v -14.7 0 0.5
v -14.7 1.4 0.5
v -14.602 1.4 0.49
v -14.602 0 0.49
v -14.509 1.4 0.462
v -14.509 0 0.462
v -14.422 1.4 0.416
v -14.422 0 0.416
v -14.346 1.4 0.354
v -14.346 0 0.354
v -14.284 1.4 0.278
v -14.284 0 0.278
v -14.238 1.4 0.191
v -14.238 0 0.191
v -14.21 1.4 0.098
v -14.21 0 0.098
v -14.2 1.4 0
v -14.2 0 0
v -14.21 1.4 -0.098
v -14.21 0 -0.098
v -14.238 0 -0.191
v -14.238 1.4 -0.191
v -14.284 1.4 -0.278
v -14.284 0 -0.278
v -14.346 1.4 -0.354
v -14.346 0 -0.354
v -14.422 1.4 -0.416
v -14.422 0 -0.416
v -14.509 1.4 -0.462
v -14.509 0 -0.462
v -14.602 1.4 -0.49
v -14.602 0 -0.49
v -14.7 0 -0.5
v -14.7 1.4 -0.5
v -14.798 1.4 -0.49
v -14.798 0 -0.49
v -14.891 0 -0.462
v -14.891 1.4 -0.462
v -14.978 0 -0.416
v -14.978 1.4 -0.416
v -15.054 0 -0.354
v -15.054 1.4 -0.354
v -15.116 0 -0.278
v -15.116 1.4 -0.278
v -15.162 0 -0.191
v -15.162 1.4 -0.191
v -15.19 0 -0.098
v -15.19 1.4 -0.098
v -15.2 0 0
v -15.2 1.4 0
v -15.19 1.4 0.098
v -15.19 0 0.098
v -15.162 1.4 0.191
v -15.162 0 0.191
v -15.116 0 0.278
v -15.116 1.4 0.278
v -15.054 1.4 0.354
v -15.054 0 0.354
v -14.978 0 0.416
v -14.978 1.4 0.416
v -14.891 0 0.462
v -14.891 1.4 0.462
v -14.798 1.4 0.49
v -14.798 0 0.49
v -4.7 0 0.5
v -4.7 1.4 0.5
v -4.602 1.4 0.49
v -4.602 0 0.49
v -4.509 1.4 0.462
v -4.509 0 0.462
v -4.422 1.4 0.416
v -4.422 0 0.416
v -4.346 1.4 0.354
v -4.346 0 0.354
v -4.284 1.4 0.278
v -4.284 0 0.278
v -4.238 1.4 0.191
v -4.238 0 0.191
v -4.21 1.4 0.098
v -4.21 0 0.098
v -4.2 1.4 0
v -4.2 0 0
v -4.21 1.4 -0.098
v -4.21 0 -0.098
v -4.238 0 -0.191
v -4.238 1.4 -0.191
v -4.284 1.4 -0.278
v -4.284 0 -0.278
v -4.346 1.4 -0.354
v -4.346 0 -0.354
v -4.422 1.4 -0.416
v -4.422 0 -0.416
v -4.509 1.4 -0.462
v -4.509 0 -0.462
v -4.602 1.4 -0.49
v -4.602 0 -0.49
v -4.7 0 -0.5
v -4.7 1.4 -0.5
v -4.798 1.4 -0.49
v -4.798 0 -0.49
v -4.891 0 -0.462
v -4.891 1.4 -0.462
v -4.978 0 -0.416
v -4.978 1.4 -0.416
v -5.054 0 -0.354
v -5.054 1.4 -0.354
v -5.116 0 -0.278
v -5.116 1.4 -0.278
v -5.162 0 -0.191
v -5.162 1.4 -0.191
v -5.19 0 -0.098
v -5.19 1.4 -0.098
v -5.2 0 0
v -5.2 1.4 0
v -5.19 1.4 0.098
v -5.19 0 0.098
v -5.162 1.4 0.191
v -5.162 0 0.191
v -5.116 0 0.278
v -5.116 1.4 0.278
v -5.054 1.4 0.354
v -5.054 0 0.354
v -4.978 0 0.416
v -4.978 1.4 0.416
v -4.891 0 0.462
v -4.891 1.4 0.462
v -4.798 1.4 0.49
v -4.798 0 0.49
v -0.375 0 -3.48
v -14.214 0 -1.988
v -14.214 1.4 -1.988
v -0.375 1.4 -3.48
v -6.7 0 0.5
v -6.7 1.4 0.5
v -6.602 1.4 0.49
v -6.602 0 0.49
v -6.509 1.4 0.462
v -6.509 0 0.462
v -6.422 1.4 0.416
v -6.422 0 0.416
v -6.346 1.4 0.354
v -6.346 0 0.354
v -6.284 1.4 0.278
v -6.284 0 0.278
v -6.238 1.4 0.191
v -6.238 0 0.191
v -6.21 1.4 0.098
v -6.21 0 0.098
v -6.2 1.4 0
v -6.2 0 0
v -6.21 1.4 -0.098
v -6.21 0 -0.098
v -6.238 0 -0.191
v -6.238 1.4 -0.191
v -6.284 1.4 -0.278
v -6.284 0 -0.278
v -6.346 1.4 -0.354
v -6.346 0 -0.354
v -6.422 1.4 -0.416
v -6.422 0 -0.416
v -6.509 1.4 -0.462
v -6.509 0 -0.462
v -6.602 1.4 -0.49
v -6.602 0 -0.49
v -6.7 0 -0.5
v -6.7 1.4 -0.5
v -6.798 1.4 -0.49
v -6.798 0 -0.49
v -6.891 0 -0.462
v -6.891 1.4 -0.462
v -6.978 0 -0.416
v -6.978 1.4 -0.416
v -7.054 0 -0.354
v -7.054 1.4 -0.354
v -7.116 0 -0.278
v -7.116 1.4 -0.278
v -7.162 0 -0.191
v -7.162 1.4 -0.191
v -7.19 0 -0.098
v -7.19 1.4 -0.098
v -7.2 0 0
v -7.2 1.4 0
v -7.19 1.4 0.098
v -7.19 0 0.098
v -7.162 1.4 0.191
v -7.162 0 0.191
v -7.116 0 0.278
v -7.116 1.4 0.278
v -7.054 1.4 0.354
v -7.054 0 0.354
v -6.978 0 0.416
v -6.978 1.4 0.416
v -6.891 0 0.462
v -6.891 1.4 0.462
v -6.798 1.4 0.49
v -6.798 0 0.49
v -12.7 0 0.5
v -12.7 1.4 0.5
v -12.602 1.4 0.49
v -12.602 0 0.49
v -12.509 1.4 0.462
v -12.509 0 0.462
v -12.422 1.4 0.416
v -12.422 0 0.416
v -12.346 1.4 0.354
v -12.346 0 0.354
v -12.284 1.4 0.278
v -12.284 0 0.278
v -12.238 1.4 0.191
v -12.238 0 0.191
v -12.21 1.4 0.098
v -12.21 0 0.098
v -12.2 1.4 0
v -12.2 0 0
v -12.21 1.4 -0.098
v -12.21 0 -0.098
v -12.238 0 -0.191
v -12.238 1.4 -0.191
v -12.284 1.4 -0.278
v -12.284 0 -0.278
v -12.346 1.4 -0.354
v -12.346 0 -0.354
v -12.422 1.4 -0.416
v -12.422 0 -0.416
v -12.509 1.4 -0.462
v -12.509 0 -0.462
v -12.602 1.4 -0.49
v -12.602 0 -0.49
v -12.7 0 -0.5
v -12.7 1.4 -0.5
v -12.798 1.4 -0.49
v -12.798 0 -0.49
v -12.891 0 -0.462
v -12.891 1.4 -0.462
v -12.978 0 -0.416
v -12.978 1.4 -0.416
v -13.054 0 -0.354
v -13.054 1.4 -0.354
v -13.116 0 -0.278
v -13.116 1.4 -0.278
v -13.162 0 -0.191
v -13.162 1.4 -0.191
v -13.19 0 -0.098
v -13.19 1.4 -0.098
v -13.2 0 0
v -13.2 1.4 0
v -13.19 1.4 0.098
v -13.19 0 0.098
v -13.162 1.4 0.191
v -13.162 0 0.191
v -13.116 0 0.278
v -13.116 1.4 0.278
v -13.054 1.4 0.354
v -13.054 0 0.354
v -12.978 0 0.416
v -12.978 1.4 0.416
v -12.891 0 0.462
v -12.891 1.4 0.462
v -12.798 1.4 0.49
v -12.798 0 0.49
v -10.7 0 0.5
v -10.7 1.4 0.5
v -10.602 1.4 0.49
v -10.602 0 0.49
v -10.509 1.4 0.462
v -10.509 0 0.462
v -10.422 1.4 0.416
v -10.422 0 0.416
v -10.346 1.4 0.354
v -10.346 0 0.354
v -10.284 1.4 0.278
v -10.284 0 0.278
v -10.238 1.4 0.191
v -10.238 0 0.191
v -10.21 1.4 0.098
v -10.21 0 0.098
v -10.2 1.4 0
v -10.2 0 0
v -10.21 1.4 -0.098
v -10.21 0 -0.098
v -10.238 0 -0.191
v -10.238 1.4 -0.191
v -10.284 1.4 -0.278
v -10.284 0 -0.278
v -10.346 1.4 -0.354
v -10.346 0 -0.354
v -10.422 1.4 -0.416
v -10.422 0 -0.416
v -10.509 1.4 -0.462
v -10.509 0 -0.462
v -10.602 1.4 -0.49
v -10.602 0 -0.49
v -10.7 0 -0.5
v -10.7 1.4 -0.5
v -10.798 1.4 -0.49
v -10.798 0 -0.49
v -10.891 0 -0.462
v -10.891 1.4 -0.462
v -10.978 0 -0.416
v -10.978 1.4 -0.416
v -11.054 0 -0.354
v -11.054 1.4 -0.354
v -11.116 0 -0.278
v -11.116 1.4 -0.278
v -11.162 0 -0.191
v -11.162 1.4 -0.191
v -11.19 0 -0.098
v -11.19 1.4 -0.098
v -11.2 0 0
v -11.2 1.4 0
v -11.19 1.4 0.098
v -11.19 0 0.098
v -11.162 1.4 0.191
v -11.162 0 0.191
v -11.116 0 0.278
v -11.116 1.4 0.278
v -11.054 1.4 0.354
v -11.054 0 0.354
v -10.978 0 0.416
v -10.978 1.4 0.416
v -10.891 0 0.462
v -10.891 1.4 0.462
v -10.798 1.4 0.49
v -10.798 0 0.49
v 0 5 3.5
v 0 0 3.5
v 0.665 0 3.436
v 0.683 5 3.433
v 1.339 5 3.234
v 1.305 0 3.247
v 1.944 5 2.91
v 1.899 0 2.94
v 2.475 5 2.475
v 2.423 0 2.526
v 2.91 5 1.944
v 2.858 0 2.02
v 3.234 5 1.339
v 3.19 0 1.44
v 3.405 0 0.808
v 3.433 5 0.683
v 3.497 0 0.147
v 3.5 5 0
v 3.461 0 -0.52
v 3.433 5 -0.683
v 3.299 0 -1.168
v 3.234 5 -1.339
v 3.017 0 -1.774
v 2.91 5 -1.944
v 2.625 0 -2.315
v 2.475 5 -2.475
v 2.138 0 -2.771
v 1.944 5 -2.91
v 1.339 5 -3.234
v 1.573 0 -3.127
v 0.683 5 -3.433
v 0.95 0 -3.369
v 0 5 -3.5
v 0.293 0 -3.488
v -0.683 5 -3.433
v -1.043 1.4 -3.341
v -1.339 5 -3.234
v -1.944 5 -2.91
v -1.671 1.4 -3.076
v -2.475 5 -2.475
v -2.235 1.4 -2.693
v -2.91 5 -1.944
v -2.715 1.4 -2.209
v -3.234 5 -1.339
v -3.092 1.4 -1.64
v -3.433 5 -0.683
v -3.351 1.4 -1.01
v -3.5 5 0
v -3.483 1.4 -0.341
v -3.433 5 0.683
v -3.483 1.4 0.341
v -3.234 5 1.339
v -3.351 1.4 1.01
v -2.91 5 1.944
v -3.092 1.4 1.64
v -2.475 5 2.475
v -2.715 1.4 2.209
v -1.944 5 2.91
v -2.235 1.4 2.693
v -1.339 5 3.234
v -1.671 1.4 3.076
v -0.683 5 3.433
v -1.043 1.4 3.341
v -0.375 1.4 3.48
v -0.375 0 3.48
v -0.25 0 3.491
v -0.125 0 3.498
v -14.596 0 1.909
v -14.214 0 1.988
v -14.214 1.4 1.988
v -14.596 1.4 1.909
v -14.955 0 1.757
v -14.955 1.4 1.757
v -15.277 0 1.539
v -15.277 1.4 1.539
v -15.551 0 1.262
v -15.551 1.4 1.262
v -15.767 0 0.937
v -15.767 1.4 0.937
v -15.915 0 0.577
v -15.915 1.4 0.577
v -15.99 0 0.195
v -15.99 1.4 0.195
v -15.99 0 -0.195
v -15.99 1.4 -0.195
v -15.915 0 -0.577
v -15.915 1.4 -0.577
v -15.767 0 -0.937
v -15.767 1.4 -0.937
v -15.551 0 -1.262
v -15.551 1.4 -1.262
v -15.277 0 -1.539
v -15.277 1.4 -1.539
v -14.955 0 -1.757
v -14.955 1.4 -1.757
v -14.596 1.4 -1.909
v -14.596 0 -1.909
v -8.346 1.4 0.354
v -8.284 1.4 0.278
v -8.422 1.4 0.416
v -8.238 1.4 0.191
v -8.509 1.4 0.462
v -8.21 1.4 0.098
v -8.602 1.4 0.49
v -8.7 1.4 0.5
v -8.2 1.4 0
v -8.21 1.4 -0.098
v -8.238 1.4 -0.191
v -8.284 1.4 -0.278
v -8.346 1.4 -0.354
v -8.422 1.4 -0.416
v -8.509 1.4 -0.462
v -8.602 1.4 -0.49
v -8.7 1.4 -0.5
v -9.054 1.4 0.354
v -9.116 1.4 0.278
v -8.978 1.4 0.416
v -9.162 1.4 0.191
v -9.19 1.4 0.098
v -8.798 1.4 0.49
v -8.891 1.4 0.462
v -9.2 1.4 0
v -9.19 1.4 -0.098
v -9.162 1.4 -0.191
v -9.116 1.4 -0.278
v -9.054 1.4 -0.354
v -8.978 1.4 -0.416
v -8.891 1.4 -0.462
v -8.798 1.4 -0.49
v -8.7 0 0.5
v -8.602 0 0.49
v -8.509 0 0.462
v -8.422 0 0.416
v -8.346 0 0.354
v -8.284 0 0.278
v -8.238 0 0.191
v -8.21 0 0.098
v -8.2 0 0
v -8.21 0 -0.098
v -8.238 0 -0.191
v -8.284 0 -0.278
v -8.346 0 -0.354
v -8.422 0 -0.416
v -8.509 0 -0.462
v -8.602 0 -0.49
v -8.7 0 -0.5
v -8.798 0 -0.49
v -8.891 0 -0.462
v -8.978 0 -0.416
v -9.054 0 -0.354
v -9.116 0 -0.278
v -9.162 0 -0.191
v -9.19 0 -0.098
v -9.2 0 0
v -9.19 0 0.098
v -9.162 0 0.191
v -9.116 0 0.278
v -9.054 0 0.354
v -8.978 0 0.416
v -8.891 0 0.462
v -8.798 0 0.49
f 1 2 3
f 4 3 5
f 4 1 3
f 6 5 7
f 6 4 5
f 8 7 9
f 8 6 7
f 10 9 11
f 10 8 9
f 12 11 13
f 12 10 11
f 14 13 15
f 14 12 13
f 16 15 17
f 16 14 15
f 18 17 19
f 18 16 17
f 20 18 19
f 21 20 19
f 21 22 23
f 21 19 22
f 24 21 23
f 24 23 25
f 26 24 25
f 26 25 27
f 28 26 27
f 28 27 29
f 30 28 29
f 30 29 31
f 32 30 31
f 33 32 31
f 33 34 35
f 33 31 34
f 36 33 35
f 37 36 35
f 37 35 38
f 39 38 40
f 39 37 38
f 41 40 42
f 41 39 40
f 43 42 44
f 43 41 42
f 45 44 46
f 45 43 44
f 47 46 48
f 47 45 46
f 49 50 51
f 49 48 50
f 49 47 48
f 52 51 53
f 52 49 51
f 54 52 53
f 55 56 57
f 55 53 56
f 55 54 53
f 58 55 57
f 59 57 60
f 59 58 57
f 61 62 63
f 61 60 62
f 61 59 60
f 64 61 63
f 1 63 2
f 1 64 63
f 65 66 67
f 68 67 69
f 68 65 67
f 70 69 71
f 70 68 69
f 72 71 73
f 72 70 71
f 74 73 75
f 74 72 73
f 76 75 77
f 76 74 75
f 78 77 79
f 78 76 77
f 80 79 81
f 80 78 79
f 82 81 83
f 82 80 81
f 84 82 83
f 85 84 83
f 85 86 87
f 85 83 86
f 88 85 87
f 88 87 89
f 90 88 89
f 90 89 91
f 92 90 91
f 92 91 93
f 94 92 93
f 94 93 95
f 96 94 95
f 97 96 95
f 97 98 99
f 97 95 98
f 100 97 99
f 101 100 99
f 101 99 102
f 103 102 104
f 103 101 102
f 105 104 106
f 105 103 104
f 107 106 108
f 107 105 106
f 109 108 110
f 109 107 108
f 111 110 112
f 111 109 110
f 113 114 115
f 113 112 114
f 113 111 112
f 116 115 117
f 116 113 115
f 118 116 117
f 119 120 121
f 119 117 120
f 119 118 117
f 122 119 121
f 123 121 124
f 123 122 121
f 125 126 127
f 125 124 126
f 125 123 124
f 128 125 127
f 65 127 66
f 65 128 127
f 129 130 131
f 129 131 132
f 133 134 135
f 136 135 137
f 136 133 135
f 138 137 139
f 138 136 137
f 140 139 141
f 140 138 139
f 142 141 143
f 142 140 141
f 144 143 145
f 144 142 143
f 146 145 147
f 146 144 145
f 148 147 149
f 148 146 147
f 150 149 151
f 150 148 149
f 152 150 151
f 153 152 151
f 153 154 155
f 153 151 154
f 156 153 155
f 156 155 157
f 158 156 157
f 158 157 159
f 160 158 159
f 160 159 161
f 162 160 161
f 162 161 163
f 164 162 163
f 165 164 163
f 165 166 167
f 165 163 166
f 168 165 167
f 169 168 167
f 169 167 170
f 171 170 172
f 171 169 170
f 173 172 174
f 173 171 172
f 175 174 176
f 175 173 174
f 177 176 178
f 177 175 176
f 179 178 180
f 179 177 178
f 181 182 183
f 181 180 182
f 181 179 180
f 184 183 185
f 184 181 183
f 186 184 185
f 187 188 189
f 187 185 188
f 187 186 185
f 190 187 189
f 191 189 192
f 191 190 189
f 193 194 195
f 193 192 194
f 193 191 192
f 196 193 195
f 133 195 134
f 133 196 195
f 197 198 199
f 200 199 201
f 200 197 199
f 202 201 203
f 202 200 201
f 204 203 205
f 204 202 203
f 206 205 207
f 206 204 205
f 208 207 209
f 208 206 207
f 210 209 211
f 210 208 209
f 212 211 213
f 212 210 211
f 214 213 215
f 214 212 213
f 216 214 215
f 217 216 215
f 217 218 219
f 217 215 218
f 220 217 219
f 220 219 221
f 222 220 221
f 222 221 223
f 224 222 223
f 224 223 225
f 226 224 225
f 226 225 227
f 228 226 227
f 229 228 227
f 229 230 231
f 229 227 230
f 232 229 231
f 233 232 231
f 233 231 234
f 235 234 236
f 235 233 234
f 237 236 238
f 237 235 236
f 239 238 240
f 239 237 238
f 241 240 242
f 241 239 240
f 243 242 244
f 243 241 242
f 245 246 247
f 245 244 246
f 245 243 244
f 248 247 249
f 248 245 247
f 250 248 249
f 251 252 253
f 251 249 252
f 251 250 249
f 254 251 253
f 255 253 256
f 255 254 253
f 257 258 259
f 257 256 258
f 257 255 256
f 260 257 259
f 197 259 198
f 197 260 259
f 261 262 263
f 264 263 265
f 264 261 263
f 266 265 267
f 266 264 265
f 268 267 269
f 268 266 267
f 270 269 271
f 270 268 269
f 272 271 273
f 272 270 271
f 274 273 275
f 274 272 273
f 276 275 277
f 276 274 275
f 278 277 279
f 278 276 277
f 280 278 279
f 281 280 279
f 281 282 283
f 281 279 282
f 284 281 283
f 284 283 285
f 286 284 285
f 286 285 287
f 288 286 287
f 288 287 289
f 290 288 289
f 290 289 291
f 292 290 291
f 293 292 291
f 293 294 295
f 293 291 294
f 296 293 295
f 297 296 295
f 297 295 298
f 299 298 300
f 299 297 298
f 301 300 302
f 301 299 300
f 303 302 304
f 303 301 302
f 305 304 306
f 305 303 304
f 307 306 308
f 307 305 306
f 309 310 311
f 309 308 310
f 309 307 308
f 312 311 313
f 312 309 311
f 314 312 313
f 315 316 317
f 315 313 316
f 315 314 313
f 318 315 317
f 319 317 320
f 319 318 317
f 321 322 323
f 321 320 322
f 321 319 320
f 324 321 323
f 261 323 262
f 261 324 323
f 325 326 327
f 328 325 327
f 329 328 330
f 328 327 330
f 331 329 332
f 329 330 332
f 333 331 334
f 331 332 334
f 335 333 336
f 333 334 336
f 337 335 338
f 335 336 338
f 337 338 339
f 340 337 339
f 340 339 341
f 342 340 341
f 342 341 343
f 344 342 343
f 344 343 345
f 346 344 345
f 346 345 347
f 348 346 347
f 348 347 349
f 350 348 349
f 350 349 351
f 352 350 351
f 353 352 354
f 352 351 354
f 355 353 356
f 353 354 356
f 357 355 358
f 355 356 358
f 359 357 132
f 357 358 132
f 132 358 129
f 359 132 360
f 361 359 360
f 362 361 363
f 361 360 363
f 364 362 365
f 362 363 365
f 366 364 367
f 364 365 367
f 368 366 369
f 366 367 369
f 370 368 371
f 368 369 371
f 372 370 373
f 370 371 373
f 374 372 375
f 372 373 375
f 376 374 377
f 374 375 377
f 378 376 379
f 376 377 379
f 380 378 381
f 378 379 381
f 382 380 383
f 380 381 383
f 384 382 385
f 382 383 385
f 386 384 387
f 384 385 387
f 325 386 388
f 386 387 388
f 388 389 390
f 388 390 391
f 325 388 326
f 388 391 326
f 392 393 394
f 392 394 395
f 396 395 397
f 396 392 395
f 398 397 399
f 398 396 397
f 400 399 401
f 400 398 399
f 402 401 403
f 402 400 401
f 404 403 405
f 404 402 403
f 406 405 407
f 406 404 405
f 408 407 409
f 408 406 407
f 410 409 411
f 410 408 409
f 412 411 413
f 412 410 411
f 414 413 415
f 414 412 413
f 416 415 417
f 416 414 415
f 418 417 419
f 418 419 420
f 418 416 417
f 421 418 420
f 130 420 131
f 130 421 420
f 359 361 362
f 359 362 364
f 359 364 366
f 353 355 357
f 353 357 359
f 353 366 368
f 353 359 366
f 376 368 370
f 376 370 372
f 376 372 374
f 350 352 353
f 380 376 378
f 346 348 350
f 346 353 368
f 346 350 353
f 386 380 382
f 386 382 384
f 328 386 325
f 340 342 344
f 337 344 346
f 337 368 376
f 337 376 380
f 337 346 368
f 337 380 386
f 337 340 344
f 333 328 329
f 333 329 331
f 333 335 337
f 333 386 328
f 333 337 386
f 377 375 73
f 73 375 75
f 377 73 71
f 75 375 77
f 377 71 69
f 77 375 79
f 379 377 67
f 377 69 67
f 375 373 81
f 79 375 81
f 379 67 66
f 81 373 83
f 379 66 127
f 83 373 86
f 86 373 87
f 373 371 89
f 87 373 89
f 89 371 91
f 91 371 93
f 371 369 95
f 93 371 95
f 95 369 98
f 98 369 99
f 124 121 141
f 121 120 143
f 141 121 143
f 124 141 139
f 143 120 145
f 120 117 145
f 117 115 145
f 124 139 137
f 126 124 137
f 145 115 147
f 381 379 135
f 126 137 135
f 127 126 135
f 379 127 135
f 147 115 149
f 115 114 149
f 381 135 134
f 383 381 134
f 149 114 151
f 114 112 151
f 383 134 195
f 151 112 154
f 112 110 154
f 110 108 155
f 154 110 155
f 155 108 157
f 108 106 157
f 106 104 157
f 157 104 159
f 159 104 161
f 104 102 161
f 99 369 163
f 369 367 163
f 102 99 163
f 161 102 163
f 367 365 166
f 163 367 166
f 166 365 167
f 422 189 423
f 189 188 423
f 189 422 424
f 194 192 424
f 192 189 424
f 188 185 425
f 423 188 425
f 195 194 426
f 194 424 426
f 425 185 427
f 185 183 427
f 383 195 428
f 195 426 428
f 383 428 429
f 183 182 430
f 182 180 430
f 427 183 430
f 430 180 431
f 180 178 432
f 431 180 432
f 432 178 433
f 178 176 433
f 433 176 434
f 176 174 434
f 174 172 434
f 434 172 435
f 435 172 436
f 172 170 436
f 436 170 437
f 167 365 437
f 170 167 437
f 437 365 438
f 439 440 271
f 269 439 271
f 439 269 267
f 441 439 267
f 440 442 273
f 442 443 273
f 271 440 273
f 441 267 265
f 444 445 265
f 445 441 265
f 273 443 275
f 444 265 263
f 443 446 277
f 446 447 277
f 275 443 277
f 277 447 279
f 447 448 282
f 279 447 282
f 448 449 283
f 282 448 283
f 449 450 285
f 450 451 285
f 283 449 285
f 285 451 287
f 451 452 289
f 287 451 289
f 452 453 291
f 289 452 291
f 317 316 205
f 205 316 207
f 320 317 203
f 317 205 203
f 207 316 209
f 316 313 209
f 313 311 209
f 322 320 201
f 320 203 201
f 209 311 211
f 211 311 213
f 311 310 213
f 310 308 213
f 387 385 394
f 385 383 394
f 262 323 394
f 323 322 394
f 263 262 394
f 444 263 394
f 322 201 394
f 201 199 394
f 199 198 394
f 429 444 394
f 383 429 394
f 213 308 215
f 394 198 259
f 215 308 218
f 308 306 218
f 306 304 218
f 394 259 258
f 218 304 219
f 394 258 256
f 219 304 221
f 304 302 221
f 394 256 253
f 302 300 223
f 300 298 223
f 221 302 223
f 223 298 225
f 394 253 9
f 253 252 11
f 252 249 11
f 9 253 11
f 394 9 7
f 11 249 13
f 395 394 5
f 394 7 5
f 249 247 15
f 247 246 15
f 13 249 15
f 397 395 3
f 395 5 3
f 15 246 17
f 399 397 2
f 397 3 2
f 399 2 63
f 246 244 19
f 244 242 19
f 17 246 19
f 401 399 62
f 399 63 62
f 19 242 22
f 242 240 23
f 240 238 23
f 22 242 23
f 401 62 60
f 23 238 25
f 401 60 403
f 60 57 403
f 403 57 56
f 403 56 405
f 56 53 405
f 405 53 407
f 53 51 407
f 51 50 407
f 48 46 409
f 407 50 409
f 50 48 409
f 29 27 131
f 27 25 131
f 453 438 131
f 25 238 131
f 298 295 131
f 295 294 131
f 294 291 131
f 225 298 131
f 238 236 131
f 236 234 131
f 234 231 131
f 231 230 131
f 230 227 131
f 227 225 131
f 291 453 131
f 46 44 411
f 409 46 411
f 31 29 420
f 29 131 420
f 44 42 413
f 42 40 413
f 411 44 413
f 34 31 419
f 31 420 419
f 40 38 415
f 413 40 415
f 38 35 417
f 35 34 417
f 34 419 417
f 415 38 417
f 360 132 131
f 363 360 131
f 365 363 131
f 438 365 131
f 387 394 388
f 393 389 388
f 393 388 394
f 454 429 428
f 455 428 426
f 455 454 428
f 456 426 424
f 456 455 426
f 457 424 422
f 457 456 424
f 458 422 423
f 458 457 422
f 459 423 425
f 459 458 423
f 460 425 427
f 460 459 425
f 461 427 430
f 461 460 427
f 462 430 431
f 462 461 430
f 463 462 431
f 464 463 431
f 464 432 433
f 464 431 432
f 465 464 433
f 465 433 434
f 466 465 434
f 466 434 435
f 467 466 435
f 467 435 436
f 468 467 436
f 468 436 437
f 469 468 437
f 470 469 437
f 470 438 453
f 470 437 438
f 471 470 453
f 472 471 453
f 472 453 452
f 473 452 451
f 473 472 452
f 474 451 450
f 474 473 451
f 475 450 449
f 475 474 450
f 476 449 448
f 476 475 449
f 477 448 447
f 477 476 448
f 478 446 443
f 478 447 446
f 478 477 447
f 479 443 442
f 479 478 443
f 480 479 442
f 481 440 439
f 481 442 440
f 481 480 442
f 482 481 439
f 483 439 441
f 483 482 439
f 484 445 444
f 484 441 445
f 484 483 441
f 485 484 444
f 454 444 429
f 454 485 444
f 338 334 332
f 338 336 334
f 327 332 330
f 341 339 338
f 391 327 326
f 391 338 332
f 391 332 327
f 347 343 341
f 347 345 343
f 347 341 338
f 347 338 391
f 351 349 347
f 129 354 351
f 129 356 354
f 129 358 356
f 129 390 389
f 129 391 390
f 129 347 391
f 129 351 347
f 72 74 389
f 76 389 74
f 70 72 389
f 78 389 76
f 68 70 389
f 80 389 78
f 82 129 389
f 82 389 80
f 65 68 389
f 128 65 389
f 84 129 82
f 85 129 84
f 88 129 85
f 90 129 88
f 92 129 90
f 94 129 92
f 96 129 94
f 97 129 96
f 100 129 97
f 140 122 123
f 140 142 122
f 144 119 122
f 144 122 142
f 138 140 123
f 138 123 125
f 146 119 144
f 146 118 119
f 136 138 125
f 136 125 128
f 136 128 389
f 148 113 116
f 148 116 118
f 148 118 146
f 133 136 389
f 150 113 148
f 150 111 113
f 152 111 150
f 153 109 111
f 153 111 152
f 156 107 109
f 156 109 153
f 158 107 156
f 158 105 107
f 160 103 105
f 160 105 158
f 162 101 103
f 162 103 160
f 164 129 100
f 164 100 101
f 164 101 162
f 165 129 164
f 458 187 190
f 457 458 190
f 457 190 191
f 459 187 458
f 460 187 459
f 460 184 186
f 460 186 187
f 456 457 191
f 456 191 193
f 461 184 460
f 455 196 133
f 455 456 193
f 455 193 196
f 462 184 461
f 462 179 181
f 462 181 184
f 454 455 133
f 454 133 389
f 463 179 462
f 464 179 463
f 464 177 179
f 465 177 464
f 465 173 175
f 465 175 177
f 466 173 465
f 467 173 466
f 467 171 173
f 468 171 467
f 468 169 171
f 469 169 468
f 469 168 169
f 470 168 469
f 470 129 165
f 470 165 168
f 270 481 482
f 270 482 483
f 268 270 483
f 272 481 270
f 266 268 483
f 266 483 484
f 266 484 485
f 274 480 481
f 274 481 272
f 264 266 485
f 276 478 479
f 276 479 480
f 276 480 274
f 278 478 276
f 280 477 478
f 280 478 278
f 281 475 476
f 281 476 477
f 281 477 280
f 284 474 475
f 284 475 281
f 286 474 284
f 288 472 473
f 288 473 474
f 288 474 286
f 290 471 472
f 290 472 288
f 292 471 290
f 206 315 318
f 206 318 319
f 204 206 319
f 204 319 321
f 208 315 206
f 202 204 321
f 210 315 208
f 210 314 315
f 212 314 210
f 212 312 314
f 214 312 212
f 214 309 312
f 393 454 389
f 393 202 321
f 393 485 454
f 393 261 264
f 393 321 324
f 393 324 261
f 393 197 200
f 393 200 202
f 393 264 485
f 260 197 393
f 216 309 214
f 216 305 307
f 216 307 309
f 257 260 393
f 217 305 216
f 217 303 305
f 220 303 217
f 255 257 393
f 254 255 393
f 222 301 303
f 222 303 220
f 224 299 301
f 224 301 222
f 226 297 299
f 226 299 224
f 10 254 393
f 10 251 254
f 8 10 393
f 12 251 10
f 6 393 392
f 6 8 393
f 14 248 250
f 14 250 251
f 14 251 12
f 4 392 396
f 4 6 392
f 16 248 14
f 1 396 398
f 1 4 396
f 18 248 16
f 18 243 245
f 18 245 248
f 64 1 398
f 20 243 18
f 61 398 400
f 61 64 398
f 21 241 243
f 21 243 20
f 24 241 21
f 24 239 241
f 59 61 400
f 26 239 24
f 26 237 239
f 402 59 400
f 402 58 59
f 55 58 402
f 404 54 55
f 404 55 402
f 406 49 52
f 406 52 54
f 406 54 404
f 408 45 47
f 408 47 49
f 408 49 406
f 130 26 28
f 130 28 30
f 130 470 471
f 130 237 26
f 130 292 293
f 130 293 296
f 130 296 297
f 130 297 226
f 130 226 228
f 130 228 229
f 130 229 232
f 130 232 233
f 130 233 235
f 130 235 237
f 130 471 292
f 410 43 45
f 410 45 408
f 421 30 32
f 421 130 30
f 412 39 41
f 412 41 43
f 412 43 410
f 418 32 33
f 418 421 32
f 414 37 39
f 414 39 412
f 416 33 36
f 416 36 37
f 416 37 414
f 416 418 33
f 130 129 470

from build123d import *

# Parameters (mm, degrees)
ESBO_O1_R                = 3.5
RESSALTO_EXTRUS_O1_DEPTH = 5
RESSALTO_EXTRUS_O2_DEPTH = 1.4
ESBO_O3_R                = 0.5
CORTE_EXTRUS_O1_DEPTH    = 18.12454379
PADR_O_LINEAR1_COUNT     = 6
PADR_O_LINEAR1_PITCH     = 2


with BuildPart() as part:
    # Esboço1 → Ressalto-extrusão1 (new body)
    with BuildSketch(Plane(origin=(0, 0, 0), x_dir=(1, 0, 0), z_dir=(0, 1, 0))):
        Circle(ESBO_O1_R)
    extrude(amount=RESSALTO_EXTRUS_O1_DEPTH)

    # Esboço2 → Ressalto-extrusão2 (add)
    with BuildSketch(Plane(origin=(0, 0, 0), x_dir=(1, 0, 0), z_dir=(0, 1, 0))):
        with BuildLine():
            Line((-14.214285714, 1.988487272), (-0.375, 3.479852727))
            Line((-0.375, 3.479852727), (-0.375, -3.479852727))
            Line((-0.375, -3.479852727), (-14.214285714, -1.988487272))
            ThreePointArc((-14.214285714, -1.988487272), (-16, 0), (-14.214285714, 1.988487272))
        make_face()
    extrude(amount=RESSALTO_EXTRUS_O2_DEPTH)

    # Esboço3 → Corte-extrusão1 (cut, through all)
    with BuildSketch(Plane(origin=(0, 0, 0), x_dir=(1, 0, 0), z_dir=(0, 1, 0))):
        with Locations((-14.7, 0)):
            Circle(ESBO_O3_R)
    corte_extrus_o1 = extrude(amount=CORTE_EXTRUS_O1_DEPTH, mode=Mode.SUBTRACT)

    # Padrão linear1: Corte-extrusão1 ×6
    with Locations(*[(i * PADR_O_LINEAR1_PITCH, 0, 0) for i in range(1, PADR_O_LINEAR1_COUNT)]):
        add(corte_extrus_o1, mode=Mode.SUBTRACT)


solid = part.part
